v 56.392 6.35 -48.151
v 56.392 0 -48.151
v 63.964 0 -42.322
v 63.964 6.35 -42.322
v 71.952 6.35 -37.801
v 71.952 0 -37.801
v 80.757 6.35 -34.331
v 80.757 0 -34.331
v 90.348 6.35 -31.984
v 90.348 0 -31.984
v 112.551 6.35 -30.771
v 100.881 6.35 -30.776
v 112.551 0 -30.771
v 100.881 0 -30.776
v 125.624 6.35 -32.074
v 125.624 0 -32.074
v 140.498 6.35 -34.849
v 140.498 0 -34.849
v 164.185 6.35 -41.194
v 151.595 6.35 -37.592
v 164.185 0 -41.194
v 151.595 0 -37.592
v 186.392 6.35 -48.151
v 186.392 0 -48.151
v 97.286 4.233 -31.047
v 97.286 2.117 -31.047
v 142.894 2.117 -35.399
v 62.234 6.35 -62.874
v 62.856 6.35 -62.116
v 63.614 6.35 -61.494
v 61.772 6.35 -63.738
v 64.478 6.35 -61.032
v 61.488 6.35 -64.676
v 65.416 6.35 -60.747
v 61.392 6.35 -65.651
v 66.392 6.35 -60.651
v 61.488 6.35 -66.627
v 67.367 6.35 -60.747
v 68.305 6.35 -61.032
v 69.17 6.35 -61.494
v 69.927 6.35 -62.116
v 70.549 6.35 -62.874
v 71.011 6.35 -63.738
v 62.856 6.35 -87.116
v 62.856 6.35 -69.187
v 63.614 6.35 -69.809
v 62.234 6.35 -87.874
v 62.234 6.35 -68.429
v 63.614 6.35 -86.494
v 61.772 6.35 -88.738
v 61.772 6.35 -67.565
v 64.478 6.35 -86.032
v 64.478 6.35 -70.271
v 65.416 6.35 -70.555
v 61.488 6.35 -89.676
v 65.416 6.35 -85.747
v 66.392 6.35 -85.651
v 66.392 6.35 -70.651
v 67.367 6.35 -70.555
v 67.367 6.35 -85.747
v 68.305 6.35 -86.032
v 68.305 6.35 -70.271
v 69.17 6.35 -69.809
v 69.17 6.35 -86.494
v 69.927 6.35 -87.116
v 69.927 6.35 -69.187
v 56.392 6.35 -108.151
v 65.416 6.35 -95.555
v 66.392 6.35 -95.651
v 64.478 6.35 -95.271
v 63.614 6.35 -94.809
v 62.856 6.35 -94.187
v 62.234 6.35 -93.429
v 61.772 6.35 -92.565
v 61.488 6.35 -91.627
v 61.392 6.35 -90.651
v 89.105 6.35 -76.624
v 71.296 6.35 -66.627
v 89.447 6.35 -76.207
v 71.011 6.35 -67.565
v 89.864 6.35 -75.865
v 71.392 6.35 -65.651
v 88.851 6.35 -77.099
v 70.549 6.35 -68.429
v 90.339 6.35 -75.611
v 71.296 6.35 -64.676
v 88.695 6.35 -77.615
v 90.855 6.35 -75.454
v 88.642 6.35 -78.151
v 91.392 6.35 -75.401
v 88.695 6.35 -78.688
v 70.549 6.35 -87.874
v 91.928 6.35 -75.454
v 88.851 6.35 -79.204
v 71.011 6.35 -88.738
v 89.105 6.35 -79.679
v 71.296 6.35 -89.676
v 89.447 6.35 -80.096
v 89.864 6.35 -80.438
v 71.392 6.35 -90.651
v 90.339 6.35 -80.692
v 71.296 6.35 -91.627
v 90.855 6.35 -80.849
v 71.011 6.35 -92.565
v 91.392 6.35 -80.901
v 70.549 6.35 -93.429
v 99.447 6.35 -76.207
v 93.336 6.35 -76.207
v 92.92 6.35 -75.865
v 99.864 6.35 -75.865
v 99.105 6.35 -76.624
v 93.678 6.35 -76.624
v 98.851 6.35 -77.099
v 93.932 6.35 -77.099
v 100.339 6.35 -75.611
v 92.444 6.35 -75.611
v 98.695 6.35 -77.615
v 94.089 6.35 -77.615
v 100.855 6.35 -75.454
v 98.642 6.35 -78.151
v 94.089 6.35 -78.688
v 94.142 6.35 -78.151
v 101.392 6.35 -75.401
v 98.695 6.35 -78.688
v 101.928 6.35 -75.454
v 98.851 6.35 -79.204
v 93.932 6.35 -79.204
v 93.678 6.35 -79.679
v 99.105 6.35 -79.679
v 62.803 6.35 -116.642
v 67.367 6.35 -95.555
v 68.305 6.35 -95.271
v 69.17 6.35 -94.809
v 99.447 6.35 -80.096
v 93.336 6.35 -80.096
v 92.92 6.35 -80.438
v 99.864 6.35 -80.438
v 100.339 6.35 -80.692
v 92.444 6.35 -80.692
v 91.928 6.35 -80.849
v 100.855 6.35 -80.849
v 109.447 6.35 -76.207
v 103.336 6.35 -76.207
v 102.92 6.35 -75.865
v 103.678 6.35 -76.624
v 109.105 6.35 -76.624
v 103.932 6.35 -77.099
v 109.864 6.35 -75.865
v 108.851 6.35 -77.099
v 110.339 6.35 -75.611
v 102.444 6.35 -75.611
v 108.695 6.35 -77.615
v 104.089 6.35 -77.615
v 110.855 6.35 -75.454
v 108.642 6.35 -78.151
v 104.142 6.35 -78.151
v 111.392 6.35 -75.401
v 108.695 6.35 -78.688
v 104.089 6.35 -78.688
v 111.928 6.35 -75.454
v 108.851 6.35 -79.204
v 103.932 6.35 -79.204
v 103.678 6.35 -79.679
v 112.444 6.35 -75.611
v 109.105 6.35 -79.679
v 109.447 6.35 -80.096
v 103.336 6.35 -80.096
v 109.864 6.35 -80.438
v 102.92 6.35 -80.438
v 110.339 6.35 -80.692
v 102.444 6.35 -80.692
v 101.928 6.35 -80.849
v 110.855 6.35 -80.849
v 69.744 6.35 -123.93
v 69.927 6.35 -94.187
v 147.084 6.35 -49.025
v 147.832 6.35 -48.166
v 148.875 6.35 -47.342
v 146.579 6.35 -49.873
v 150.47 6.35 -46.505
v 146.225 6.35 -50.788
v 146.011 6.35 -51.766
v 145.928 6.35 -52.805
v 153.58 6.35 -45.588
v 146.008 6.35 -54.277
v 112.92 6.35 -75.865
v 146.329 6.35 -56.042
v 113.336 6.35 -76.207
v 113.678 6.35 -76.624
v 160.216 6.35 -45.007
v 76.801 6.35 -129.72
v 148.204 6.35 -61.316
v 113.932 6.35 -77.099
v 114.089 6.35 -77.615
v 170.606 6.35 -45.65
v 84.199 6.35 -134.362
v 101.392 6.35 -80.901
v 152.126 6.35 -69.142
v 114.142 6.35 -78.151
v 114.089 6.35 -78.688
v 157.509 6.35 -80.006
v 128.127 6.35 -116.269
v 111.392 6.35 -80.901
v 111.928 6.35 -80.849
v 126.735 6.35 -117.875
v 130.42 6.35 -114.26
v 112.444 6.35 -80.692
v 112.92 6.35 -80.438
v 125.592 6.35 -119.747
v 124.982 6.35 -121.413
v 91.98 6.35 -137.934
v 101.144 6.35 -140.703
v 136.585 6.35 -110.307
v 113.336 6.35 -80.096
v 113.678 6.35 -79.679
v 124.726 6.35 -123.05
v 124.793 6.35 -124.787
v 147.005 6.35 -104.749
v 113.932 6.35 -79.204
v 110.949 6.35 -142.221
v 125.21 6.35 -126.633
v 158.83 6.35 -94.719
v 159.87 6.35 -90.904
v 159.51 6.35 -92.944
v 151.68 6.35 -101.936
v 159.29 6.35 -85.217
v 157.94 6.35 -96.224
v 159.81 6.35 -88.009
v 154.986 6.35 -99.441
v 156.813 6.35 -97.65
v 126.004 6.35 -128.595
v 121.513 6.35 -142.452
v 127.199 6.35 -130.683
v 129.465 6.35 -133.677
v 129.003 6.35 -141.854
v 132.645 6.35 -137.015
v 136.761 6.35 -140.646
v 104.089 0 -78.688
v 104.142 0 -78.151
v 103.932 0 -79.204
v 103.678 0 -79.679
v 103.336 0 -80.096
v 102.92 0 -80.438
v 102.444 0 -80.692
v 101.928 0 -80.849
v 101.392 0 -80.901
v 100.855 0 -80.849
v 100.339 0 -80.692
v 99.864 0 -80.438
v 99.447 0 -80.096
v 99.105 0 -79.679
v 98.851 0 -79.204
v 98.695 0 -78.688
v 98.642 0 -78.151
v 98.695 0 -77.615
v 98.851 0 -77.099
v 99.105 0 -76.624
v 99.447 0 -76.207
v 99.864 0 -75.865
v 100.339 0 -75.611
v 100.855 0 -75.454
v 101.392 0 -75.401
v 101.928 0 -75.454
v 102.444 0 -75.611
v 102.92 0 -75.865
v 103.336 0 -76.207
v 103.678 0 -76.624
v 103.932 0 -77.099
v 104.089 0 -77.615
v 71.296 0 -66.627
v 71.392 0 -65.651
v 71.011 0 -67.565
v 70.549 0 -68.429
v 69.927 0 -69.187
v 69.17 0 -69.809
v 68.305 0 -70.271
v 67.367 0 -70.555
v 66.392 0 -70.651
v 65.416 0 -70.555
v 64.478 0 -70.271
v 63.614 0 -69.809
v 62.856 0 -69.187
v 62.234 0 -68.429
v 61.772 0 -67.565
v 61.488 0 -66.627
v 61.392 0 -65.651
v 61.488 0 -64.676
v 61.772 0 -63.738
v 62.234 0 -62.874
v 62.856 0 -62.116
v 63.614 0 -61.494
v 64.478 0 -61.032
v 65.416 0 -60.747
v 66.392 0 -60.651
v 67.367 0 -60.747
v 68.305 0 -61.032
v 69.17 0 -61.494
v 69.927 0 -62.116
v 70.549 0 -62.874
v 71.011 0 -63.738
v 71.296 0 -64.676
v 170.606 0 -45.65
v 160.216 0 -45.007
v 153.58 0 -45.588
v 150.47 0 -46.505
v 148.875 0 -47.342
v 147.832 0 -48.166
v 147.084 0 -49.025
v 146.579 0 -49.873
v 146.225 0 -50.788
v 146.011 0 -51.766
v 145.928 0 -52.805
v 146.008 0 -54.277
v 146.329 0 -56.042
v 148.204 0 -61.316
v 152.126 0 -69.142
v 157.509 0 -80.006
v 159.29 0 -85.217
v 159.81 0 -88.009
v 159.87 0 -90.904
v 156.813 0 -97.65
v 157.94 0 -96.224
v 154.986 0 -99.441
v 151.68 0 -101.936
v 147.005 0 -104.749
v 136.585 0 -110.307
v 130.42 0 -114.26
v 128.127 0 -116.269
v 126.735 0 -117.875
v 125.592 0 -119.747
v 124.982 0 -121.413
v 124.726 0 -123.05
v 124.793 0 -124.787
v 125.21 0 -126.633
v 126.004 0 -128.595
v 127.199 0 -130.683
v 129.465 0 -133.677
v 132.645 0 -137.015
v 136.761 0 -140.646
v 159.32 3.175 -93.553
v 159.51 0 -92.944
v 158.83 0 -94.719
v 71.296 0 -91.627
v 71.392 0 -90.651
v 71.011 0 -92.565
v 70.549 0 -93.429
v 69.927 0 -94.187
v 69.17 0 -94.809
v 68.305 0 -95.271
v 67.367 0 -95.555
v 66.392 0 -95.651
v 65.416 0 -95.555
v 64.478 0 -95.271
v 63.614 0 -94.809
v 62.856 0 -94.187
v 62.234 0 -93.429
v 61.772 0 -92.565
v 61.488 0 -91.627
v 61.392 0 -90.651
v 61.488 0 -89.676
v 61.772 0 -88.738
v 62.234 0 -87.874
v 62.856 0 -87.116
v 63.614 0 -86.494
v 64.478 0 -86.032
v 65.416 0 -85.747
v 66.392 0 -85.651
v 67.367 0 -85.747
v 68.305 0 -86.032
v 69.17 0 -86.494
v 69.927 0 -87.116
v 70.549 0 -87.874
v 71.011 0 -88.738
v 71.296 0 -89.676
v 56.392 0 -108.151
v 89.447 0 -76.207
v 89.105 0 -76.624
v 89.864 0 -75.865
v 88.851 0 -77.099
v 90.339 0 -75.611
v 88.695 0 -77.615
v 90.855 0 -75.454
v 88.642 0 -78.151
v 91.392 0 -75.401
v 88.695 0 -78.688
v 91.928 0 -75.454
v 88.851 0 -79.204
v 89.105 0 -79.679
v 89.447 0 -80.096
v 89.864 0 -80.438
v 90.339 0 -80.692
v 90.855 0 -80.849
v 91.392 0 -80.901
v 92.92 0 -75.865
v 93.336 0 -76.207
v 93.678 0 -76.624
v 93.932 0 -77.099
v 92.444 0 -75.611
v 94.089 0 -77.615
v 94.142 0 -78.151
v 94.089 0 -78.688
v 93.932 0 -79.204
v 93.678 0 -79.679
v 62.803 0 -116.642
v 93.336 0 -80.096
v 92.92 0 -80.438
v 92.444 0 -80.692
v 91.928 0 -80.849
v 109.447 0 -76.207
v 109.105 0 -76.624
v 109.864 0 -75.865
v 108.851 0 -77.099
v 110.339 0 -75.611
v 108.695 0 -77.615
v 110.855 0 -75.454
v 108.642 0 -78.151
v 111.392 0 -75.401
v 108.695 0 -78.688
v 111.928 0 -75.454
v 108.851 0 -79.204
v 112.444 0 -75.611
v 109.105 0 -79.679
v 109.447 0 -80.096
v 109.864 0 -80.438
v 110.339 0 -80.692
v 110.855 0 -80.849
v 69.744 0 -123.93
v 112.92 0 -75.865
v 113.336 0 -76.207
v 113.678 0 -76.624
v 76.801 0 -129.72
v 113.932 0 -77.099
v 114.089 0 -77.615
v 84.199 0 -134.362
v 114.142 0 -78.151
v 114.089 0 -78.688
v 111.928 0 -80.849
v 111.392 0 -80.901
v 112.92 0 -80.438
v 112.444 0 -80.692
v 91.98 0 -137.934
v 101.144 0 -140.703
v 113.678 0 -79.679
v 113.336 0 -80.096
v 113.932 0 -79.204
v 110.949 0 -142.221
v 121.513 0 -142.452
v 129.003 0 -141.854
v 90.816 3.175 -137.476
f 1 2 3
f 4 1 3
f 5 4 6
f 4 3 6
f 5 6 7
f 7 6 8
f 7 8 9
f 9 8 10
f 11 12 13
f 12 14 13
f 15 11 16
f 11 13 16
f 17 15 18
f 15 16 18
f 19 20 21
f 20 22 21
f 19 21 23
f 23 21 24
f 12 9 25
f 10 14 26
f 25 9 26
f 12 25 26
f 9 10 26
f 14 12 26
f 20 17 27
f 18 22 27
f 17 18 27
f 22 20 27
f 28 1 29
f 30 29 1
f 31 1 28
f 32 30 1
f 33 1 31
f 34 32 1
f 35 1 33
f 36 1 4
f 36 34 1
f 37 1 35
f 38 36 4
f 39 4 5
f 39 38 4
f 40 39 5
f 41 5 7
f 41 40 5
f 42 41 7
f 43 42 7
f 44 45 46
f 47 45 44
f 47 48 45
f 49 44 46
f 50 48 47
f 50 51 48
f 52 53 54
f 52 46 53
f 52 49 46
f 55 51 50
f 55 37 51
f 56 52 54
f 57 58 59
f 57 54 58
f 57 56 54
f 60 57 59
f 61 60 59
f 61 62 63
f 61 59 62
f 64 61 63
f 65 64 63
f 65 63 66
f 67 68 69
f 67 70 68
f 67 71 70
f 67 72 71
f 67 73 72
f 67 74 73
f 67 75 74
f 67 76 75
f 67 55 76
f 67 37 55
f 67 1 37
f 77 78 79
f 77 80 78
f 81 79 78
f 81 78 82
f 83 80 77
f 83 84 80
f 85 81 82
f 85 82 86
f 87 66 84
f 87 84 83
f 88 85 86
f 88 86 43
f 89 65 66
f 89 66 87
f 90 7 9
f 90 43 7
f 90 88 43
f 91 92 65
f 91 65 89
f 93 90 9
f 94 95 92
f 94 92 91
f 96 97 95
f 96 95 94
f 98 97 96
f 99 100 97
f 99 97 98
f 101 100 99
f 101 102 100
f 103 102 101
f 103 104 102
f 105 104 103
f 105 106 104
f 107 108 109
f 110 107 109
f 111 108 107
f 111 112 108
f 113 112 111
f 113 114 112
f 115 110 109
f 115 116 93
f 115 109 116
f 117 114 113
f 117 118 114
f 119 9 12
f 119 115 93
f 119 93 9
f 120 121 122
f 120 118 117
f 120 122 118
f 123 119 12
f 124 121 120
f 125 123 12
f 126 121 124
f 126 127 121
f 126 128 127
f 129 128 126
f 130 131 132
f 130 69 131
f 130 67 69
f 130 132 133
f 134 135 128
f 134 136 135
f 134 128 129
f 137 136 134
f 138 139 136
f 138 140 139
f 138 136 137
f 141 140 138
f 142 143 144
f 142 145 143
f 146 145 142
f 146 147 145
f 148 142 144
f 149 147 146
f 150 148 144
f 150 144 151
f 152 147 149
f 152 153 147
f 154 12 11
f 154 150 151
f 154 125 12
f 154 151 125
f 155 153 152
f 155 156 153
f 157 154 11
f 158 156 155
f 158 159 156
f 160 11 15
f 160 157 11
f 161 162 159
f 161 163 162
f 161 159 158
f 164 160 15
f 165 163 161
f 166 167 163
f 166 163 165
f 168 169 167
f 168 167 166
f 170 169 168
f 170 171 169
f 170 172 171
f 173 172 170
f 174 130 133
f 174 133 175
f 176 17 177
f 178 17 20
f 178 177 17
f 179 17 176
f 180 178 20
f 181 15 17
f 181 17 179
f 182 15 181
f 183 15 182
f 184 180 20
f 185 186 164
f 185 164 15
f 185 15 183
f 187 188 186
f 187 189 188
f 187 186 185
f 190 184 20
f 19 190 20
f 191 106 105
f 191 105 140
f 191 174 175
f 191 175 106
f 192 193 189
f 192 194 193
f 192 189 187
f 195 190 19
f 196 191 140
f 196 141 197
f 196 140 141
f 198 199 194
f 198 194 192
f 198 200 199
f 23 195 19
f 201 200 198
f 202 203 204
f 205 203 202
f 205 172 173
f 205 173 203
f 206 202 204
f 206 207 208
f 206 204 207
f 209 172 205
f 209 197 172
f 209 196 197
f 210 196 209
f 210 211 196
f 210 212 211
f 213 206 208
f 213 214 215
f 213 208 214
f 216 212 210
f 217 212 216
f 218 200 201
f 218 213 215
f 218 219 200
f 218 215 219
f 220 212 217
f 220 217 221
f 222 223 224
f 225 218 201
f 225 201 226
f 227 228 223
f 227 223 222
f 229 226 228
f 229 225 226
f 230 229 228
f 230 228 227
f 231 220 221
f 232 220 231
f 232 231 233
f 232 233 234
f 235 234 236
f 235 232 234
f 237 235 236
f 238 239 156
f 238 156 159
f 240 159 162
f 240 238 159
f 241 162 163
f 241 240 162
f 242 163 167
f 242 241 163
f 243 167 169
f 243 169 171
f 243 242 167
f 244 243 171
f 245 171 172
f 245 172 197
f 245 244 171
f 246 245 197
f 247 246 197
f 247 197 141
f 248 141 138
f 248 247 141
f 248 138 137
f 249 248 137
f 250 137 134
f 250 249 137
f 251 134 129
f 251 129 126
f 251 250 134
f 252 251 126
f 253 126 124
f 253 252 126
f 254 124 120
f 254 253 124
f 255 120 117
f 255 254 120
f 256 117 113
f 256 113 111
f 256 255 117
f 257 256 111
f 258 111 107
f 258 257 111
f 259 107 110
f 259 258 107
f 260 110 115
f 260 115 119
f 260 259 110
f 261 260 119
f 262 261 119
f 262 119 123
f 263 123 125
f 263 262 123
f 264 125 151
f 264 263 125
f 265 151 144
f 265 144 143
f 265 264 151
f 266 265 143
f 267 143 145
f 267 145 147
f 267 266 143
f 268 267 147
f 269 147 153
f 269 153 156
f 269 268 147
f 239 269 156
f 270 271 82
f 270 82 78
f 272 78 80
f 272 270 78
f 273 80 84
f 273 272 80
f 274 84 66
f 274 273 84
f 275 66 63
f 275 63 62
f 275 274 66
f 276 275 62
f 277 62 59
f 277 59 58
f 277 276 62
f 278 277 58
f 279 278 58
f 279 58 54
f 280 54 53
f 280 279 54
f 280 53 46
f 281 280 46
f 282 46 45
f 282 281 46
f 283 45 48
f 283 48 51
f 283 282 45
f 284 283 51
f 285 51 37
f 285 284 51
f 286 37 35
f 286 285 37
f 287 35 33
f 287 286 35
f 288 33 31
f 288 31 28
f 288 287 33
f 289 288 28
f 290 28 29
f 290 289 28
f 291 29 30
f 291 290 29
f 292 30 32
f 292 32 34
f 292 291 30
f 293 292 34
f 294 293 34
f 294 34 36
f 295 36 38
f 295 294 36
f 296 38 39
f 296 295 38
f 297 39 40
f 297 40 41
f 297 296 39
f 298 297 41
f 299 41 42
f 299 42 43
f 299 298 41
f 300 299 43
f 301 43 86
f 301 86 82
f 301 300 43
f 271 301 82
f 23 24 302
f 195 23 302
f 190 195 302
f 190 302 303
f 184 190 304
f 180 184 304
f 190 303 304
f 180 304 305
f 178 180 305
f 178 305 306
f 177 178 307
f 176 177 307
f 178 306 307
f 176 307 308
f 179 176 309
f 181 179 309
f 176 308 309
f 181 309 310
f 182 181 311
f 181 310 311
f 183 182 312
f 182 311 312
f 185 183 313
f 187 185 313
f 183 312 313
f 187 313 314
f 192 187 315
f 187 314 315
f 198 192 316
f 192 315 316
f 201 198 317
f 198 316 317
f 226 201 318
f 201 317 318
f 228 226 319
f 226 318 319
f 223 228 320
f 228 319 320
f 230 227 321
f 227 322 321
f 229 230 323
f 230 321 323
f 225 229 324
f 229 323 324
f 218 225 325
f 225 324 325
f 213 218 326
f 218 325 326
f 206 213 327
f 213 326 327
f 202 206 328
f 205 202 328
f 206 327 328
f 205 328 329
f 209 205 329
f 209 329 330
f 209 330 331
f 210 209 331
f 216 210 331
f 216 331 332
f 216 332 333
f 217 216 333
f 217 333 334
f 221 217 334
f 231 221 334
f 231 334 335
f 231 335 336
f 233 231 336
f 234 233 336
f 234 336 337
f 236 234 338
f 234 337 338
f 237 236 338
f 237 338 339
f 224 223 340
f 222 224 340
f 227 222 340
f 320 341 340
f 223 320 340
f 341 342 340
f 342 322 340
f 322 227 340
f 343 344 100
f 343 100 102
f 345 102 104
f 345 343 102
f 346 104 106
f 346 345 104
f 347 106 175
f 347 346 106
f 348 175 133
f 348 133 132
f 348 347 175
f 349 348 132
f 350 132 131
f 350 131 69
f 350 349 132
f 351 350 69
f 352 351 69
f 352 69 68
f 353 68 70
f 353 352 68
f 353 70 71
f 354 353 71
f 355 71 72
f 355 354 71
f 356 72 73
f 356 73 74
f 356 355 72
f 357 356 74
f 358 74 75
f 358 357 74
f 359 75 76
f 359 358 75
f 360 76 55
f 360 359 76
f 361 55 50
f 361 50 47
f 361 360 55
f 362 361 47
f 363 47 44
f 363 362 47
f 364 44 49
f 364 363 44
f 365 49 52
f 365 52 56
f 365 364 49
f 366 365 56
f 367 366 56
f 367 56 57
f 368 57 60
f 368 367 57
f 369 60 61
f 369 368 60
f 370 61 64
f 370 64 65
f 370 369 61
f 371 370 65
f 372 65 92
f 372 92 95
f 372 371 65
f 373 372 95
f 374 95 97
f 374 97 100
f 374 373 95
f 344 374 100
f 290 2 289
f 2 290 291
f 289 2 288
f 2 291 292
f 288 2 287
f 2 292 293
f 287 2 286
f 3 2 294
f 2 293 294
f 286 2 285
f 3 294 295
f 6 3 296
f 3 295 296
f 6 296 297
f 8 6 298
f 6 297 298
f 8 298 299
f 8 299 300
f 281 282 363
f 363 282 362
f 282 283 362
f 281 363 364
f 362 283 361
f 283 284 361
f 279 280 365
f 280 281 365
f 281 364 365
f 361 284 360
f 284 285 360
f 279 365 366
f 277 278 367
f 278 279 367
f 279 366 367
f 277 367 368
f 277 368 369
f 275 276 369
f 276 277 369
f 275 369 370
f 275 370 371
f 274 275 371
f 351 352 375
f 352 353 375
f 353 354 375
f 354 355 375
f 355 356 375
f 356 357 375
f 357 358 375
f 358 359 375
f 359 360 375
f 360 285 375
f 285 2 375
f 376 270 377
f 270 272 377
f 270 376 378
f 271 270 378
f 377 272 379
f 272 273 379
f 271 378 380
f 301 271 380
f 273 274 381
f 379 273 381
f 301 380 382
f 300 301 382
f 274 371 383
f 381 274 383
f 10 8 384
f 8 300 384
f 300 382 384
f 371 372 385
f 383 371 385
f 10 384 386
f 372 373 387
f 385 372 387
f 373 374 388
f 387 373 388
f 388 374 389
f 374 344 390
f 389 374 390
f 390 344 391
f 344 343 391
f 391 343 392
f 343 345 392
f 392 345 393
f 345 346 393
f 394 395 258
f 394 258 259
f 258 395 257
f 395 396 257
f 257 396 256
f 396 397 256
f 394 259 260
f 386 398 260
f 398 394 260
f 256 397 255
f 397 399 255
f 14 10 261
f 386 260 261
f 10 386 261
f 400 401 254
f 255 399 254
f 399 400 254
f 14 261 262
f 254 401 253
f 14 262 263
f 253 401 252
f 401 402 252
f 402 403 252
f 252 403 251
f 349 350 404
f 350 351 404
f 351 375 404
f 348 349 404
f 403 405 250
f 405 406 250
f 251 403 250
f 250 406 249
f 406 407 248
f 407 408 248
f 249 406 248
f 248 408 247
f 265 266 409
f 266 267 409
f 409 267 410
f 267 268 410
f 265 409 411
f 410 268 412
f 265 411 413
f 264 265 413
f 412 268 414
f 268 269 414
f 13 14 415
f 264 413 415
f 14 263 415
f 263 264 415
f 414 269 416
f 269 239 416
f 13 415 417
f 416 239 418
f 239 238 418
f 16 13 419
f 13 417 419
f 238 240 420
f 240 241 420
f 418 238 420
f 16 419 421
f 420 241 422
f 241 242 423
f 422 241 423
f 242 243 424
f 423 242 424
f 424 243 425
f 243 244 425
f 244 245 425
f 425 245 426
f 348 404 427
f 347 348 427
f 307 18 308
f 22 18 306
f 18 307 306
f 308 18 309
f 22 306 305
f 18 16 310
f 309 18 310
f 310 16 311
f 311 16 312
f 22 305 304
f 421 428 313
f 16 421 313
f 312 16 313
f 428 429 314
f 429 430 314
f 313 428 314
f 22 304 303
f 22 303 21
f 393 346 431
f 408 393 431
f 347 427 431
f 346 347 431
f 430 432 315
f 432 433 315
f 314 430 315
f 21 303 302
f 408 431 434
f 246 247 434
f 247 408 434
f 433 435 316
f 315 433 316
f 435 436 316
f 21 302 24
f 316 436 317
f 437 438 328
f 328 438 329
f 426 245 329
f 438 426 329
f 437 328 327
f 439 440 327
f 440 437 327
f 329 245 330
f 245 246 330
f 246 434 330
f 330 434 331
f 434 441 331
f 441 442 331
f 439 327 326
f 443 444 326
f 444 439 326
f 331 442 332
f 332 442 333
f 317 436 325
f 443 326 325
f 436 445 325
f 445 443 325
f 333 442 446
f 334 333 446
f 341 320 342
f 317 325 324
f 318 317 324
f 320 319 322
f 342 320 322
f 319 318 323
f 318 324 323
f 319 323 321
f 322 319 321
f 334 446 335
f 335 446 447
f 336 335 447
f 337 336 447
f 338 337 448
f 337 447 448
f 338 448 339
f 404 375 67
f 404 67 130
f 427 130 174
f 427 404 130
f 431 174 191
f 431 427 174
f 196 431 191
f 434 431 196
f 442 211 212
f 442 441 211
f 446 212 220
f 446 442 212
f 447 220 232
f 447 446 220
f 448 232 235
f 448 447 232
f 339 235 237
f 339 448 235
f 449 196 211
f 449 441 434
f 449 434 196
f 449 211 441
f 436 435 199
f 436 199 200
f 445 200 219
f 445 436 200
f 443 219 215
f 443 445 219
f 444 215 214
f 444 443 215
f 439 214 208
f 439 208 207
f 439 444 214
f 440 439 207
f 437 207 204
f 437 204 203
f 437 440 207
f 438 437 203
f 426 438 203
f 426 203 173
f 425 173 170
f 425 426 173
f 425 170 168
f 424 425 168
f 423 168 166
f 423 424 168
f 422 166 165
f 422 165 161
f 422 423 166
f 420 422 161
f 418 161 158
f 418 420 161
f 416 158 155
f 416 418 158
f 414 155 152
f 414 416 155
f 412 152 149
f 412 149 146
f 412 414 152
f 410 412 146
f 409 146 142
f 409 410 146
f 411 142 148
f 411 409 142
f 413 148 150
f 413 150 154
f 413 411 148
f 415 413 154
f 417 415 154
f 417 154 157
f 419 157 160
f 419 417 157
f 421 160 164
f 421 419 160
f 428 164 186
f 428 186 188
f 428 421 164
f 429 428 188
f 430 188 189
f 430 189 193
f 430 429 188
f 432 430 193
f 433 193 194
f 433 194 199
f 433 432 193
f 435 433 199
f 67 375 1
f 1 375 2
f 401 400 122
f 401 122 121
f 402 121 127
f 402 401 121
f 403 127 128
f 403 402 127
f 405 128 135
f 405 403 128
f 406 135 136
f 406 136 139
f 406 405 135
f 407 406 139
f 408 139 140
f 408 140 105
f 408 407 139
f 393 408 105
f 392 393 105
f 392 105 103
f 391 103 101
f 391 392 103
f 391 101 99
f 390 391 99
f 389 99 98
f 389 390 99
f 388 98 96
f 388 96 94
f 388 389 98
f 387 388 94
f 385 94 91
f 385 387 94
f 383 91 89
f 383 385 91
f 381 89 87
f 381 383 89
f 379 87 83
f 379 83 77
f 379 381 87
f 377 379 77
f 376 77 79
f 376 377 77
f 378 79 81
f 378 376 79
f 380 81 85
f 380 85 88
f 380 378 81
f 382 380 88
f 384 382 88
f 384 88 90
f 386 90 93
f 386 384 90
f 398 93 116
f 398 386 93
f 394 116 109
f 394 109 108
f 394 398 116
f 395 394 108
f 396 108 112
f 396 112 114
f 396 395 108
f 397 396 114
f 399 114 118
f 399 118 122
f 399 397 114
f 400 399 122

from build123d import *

# Parameters (mm, degrees)
BOSS_EXTRUDE1_DEPTH = 6.35
SKETCH3_R           = 2.75
CUT_EXTRUDE1_DEPTH  = 6.35
SKETCH4_R           = 5
CUT_EXTRUDE2_DEPTH  = 6.35
SKETCH5_R           = 2.75
CUT_EXTRUDE3_DEPTH  = 6.35


with BuildPart() as part:
    # Sketch2 → Boss-Extrude1 (new body)
    with BuildSketch(Plane(origin=(0, 0, 0), x_dir=(1, 0, 0), z_dir=(0, 1, 0))):
        with BuildLine():
            Line((56.391825432, 108.15139225), (56.391825432, 48.15139225))
            add(Edge.make_bspline(
                [(56.391825432, 48.15139225), (92.653221865, 15.965688803), (146.224111167, 35.551280798), (186.391825432, 48.15139225)],
                knots=[0, 0, 0, 0, 1, 1, 1, 1], degree=3))
            add(Edge.make_bspline(
                [(186.391825432, 48.15139225), (110.317005066, 33.459687001), (213.908429008, 108.517638804), (101.791603924, 111.907716317), (136.76058899, 140.645969256)],
                knots=[0, 0, 0, 0, 0.539021374, 1, 1, 1, 1], degree=3))
            add(Edge.make_bspline(
                [(56.391825432, 108.15139225), (85.056395763, 150.553247728), (136.76058899, 140.645969256)],
                knots=[0, 0, 0, 1, 1, 1], degree=2))
        make_face()
    extrude(amount=BOSS_EXTRUDE1_DEPTH)

    # Sketch3 → Cut-Extrude1 (cut)
    with BuildSketch(Plane(origin=(0, 0, 0), x_dir=(1, 0, 0), z_dir=(0, 1, 0))):
        with Locations((101.391825432, 78.15139225)):
            Circle(SKETCH3_R)
    extrude(amount=CUT_EXTRUDE1_DEPTH, mode=Mode.SUBTRACT)

    # Sketch4 → Cut-Extrude2 (cut)
    with BuildSketch(Plane(origin=(0, 0, 0), x_dir=(1, 0, 0), z_dir=(0, 1, 0))):
        with Locations((66.391825432, 90.65139225)):
            Circle(SKETCH4_R)
        with Locations((66.391825432, 65.65139225)):
            Circle(SKETCH4_R)
    extrude(amount=CUT_EXTRUDE2_DEPTH, mode=Mode.SUBTRACT)

    # Sketch5 → Cut-Extrude3 (cut)
    with BuildSketch(Plane(origin=(0, 0, 0), x_dir=(1, 0, 0), z_dir=(0, 1, 0))):
        with Locations((101.391825432, 78.15139225)):
            Circle(SKETCH5_R)
        with Locations((111.391825432, 78.15139225)):
            Circle(SKETCH5_R)
        with Locations((91.391825432, 78.15139225)):
            Circle(SKETCH5_R)
    extrude(amount=CUT_EXTRUDE3_DEPTH, mode=Mode.SUBTRACT)


solid = part.part
